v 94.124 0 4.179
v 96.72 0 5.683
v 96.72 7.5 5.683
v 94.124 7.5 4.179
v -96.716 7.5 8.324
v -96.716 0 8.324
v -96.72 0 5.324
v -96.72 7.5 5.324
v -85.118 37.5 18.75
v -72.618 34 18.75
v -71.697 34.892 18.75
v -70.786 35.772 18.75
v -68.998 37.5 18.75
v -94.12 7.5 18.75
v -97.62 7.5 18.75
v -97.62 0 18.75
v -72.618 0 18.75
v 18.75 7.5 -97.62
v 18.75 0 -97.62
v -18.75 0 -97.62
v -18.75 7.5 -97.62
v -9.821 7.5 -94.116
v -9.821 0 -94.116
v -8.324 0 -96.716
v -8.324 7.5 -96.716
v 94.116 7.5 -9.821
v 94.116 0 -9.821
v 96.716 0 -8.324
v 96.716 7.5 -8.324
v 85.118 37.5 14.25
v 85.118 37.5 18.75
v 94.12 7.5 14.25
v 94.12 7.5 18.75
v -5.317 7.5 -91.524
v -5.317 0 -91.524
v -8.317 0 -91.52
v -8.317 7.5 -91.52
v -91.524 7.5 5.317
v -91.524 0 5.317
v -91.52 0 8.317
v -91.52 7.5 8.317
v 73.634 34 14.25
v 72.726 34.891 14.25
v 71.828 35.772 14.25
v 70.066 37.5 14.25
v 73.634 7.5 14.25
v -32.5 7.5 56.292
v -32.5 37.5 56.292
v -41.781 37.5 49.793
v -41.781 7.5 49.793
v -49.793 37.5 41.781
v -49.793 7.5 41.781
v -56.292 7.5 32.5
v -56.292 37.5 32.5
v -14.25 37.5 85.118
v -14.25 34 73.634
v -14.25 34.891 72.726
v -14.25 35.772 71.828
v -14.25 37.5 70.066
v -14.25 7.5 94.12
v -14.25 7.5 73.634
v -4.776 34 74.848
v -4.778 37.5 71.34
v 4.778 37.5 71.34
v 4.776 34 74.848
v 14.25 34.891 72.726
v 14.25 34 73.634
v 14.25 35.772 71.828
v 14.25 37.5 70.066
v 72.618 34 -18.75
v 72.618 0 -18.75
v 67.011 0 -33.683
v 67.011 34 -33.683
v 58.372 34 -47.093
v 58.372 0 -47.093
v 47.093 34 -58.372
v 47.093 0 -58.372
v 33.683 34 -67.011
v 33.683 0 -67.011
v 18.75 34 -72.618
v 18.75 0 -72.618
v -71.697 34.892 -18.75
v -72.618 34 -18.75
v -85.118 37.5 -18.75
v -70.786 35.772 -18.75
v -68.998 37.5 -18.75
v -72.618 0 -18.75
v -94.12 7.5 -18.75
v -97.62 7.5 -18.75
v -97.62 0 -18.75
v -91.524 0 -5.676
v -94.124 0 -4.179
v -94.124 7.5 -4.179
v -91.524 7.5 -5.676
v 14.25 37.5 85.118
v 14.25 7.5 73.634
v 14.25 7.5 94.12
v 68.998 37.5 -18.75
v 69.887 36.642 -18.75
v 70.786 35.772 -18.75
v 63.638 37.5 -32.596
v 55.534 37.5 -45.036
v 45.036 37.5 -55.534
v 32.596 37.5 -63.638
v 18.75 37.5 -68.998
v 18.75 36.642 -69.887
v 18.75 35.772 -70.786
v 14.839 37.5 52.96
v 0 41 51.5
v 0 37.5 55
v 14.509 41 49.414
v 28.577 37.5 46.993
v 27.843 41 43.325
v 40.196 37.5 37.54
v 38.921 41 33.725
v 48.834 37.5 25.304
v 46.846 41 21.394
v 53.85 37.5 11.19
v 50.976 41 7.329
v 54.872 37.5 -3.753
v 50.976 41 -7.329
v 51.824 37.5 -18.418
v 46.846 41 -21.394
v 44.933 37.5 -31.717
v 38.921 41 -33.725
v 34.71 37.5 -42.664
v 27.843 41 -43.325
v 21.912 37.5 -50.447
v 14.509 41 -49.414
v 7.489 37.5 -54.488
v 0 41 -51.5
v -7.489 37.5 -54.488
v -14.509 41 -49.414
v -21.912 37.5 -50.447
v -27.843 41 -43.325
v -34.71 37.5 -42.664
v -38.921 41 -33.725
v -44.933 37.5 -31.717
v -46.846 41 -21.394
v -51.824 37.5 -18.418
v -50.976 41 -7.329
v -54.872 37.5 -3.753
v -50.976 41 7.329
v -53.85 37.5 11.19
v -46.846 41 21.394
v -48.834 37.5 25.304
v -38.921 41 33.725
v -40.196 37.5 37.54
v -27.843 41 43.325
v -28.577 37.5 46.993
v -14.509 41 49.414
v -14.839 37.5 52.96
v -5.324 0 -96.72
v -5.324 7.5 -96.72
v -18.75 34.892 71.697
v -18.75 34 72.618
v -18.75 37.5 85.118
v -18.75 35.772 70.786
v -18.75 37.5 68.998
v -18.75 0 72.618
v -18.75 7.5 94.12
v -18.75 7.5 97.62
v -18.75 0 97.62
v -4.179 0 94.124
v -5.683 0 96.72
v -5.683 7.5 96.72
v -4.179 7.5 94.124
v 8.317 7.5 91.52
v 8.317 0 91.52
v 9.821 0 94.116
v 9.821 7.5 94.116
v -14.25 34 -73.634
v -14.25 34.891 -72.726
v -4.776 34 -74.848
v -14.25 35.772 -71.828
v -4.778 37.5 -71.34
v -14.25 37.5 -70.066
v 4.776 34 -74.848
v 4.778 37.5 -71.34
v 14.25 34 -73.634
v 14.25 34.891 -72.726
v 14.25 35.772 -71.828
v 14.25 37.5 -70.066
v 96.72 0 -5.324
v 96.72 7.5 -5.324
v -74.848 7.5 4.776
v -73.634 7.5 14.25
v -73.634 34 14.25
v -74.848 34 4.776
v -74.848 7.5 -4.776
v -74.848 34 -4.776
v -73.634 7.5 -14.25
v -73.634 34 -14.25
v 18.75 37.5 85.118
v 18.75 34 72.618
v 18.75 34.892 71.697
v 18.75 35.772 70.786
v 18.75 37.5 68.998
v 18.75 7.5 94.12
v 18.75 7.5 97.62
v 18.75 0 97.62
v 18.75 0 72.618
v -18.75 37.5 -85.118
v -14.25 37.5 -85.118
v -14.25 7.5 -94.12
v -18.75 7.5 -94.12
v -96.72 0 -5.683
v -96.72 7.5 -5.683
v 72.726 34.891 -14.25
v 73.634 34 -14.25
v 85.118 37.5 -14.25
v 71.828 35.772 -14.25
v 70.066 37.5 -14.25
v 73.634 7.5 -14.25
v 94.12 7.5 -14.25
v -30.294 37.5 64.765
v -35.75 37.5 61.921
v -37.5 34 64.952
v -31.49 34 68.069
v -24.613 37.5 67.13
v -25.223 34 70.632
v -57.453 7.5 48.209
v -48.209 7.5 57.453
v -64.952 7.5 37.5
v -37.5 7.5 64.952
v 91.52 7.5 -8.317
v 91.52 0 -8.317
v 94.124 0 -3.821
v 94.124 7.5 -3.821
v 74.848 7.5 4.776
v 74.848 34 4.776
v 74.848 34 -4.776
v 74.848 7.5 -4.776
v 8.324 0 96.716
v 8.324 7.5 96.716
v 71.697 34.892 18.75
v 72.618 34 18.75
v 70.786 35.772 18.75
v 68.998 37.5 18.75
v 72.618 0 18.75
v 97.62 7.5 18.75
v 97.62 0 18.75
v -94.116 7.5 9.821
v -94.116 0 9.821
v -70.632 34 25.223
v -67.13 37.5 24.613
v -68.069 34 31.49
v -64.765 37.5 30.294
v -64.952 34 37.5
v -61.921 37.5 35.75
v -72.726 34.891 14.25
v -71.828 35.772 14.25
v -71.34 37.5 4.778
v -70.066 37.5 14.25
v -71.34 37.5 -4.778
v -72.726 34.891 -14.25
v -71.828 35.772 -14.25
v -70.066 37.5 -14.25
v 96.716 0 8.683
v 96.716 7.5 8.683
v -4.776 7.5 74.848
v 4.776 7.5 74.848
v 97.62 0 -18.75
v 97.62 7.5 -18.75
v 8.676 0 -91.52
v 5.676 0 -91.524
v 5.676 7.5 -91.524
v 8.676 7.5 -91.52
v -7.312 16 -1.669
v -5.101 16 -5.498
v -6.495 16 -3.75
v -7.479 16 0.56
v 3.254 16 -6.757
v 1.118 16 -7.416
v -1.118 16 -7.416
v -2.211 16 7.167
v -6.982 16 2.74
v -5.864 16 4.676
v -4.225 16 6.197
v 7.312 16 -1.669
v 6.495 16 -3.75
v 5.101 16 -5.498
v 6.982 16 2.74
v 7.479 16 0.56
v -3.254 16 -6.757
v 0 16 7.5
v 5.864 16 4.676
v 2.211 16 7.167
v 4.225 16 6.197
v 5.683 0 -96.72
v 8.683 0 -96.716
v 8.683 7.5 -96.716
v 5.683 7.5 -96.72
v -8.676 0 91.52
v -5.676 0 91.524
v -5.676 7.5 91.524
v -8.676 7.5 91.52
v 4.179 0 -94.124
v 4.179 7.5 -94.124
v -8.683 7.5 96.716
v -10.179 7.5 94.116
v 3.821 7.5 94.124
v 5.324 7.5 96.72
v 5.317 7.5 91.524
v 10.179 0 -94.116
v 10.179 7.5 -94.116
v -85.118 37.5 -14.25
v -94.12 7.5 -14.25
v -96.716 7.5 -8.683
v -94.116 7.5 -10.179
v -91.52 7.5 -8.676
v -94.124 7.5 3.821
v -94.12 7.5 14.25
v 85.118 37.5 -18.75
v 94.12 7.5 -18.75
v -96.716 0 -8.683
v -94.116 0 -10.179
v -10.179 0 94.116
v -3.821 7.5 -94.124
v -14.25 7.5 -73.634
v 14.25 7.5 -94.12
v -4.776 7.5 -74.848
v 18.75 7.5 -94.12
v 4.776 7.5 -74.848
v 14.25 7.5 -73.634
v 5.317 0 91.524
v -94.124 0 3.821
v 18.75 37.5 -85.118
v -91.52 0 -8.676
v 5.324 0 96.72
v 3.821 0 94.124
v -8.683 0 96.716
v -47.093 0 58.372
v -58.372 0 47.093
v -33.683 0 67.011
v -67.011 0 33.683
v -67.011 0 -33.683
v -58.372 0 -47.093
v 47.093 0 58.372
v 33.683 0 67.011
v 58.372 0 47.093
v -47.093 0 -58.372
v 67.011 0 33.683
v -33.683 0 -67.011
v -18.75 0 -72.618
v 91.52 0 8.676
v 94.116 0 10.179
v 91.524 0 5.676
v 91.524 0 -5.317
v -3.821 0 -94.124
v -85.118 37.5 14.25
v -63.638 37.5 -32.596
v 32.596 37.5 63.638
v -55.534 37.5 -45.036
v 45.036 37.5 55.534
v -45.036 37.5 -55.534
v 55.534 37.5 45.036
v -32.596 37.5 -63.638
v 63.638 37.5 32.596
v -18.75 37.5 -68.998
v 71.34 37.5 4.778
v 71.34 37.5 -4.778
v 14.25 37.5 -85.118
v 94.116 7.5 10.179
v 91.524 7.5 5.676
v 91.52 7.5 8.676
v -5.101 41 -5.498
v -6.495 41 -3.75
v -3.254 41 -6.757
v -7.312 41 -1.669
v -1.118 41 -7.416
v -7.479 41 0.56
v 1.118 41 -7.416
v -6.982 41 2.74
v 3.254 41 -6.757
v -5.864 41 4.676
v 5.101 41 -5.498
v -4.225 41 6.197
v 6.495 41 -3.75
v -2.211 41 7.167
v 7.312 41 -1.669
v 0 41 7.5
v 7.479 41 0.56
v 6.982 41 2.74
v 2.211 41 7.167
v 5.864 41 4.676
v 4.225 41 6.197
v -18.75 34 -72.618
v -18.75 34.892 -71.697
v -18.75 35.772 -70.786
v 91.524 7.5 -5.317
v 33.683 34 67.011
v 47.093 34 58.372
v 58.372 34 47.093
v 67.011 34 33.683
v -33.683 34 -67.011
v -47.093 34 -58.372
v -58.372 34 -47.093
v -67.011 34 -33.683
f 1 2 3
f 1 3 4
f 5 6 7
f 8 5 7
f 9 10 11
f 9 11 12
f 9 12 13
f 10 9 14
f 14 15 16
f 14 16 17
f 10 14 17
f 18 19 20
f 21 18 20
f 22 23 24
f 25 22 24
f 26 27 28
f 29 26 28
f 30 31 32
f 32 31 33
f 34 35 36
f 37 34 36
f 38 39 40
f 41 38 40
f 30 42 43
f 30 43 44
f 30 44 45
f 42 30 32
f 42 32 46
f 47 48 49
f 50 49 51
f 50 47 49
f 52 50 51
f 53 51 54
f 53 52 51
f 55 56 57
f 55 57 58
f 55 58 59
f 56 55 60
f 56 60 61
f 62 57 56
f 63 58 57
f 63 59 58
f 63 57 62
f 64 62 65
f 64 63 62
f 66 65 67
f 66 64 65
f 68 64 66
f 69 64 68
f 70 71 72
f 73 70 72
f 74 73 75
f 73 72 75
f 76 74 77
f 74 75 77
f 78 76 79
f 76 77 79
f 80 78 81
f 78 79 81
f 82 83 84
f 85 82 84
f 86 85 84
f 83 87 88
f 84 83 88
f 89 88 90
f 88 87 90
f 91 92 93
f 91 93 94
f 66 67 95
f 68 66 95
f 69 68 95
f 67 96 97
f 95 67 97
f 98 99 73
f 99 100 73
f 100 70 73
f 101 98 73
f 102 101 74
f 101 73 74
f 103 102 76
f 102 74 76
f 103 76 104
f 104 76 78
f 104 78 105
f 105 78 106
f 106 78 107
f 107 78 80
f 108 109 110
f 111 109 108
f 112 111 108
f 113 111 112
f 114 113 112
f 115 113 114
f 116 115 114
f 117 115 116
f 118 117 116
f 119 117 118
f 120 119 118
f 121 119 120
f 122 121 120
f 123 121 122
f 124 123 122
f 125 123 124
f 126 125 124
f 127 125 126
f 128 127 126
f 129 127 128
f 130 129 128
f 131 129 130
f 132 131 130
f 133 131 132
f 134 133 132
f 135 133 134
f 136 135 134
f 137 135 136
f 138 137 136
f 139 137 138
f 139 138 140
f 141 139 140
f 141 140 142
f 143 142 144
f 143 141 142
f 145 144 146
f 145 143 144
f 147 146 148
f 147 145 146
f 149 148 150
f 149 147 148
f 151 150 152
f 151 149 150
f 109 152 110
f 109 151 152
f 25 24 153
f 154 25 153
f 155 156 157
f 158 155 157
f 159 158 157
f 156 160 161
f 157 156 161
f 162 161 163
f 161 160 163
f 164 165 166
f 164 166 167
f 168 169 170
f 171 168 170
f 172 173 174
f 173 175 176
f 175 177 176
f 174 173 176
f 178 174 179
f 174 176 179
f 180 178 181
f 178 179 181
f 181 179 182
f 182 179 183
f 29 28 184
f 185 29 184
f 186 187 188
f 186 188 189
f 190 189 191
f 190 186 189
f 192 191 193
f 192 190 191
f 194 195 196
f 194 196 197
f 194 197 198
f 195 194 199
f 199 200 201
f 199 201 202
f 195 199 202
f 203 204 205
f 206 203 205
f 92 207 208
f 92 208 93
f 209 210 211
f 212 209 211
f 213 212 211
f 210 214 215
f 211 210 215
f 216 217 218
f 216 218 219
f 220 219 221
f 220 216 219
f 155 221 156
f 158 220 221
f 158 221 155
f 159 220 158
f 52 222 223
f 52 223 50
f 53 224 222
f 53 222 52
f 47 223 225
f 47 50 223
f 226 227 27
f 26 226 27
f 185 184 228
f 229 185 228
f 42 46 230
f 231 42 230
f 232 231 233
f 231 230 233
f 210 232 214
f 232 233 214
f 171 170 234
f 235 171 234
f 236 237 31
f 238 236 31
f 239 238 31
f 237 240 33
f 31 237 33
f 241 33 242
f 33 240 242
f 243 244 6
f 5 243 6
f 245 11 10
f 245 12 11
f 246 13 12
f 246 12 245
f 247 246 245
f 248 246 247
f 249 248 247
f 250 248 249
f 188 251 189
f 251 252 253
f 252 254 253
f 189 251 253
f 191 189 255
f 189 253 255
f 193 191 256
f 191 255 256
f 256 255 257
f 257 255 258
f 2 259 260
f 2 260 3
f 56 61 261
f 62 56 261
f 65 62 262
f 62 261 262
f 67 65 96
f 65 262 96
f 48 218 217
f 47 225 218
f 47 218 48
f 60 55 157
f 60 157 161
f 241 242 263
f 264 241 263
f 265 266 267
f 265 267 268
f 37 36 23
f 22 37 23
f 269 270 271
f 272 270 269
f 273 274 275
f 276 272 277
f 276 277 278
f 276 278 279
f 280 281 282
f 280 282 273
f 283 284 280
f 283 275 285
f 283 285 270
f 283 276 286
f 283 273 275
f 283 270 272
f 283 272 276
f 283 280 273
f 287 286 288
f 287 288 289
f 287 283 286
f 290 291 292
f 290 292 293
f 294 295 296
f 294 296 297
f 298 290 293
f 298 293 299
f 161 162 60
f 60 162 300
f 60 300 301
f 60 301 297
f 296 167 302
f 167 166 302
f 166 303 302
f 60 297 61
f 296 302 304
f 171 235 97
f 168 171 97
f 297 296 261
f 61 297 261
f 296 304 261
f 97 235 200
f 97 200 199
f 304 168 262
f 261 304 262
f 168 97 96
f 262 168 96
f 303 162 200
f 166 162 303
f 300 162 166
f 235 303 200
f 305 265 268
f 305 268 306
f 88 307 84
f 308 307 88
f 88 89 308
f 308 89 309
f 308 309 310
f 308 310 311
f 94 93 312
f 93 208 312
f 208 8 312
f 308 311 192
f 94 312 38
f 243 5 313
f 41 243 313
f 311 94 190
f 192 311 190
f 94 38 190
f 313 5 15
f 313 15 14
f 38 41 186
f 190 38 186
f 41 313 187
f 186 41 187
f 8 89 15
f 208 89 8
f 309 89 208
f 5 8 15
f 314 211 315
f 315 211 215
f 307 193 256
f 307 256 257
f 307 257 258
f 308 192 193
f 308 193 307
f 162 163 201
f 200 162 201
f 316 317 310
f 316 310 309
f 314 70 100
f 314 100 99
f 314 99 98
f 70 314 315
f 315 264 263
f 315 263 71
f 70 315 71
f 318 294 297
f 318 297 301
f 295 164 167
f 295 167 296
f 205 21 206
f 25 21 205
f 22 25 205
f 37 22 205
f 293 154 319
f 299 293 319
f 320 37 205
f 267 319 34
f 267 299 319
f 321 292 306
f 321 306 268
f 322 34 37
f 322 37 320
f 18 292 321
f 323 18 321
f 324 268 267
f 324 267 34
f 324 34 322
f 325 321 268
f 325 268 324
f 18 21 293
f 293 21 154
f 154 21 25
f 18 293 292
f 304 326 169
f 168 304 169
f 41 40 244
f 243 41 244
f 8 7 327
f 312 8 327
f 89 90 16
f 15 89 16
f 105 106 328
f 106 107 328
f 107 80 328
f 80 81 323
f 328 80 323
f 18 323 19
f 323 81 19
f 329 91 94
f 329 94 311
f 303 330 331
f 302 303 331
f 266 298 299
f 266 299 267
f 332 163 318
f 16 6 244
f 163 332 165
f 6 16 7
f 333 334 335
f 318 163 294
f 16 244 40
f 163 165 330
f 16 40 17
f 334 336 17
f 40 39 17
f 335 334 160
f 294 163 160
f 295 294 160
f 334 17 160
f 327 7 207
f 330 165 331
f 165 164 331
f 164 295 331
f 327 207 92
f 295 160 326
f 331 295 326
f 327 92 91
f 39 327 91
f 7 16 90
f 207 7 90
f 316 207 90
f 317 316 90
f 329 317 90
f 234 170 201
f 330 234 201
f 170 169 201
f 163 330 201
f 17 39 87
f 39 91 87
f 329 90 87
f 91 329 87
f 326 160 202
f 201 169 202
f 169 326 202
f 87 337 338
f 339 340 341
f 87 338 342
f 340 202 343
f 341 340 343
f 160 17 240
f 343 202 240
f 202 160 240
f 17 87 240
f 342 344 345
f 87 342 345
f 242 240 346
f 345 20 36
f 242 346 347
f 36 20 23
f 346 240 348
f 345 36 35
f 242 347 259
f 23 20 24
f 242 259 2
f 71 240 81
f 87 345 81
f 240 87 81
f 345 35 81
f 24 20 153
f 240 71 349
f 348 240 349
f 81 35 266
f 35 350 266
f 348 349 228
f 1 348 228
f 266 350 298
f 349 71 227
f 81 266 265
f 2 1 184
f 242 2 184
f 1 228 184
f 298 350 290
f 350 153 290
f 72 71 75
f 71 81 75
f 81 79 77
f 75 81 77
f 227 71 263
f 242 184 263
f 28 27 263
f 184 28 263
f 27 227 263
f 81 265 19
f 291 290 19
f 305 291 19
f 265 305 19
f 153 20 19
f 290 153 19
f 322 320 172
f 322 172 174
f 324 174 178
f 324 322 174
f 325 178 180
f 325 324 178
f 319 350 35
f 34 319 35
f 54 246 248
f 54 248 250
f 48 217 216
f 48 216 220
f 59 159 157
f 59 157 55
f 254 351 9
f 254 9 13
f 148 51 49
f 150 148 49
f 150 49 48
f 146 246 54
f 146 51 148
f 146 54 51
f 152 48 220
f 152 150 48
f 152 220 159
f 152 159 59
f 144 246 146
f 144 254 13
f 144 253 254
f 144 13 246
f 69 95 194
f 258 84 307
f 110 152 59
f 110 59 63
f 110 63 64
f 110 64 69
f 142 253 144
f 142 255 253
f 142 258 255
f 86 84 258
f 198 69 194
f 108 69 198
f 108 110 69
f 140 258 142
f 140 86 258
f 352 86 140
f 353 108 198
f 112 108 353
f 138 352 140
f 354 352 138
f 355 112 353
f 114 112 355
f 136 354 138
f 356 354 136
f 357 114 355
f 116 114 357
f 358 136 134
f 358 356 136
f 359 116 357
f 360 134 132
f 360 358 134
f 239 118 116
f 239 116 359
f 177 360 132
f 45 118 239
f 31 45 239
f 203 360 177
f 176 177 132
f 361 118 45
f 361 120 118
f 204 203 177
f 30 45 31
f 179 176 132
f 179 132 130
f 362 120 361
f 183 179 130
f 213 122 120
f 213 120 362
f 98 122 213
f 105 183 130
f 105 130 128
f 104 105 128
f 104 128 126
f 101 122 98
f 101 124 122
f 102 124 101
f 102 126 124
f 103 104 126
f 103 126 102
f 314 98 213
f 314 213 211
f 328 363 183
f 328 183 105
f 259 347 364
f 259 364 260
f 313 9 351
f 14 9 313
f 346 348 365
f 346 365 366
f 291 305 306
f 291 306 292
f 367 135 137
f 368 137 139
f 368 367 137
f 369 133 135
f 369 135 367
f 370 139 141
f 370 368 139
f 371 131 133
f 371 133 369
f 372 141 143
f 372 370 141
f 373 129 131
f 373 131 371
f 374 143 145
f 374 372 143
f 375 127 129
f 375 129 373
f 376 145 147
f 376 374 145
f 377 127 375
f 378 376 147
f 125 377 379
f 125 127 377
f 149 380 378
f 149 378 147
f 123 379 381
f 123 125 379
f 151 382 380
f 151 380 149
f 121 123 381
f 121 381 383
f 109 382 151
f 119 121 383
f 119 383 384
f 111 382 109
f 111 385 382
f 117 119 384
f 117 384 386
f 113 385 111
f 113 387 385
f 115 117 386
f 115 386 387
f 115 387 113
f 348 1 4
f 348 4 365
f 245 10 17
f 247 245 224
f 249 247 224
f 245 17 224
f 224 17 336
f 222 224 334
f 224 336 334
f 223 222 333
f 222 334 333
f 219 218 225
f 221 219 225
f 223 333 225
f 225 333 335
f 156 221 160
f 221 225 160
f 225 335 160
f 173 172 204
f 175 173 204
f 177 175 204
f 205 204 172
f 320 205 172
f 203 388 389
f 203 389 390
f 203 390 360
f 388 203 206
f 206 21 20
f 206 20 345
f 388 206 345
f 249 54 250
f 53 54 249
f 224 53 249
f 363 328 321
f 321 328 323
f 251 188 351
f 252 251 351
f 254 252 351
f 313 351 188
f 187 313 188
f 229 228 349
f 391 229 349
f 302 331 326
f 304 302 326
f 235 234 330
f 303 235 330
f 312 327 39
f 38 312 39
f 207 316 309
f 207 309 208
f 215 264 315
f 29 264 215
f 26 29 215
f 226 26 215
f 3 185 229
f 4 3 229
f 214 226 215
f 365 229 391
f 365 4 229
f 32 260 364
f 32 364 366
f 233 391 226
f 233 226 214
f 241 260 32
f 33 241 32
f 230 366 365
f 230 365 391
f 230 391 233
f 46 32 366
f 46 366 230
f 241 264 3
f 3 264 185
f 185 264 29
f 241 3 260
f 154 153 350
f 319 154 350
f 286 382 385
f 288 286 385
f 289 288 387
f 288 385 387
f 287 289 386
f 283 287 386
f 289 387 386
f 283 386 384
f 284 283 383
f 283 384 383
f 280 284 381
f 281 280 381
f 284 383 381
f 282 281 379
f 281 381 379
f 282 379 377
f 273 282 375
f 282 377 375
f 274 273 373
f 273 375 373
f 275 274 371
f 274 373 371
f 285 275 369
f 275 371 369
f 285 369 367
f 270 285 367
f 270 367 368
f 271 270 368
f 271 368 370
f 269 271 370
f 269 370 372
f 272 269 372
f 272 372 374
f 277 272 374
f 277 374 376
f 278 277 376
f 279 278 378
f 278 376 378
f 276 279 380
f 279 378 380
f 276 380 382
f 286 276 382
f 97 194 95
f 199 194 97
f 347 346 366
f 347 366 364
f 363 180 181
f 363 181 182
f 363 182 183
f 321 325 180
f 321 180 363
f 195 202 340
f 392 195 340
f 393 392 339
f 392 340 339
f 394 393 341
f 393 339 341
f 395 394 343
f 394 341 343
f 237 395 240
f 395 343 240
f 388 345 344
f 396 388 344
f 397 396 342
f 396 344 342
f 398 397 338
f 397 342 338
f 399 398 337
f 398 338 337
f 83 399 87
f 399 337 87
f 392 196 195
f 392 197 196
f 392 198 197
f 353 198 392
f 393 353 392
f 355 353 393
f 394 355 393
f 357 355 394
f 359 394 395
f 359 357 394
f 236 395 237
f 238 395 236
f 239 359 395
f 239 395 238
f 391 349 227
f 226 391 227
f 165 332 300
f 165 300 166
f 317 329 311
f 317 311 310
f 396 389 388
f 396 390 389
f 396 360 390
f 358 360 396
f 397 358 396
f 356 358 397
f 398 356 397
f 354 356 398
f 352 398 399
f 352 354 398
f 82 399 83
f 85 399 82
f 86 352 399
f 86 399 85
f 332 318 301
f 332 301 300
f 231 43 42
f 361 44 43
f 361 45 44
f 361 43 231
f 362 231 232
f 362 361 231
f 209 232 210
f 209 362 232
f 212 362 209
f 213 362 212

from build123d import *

# Parameters (mm, degrees)
BOSS_EXTRUDE1_DEPTH                      = 37.5
SKETCH4_W                                = 3.5
SKETCH4_H                                = 30
CUT_EXTRUDE1_DEPTH                       = 37.5
SKETCH7_W                                = 3.5
SKETCH7_H                                = 30
CUT_EXTRUDE3_DEPTH                       = 157.454118834
CUT_EXTRUDE4_START                       = -30
CUT_EXTRUDE4_DEPTH                       = 30
CHAMFER1_SIZE                            = 3.5
CUT_EXTRUDE5_DEPTH                       = 157.454118834
MIRROR4_AT_THE_SECOND_PLANE_COPY_1_DEPTH = 157.454118834
CUT_EXTRUDE6_DEPTH                       = 157.454118834
CUT_EXTRUDE7_DEPTH                       = 144.057956088
CUT_EXTRUDE7_DEPTH_BACK                  = 30
SKETCH14_R                               = 55
BOSS_EXTRUDE3_DEPTH                      = 3.5
CHAMFER2_SIZE                            = 3.5
SKETCH15_R                               = 7.5
CUT_EXTRUDE8_DEPTH                       = 25


with BuildPart() as part:
    # Sketch2 → Boss-Extrude1 (new body)
    with BuildSketch(Plane(origin=(0, 0, 0), x_dir=(1, 0, 0), z_dir=(0, 1, 0))):
        with BuildLine():
            Line((97.62, 0), (97.62, 18.75))
            Line((97.62, 18.75), (72.618437741, 18.75))
            ThreePointArc((72.618437741, 18.75), (53.033008589, 53.033008589), (18.75, 72.618437741))
            Line((18.75, 72.618437741), (18.75, 97.62))
            Line((18.75, 97.62), (0, 97.62))
            Line((0, 97.62), (-18.75, 97.62))
            Line((-18.75, 97.62), (-18.75, 72.618437741))
            ThreePointArc((-18.75, 72.618437741), (-53.033008589, 53.033008589), (-72.618437741, 18.75))
            Line((-72.618437741, 18.75), (-97.62, 18.75))
            Line((-97.62, 18.75), (-97.62, 0))
            Line((-97.62, 0), (-97.62, -18.75))
            Line((-97.62, -18.75), (-72.618437741, -18.75))
            ThreePointArc((-72.618437741, -18.75), (-53.033008589, -53.033008589), (-18.75, -72.618437741))
            Line((-18.75, -72.618437741), (-18.75, -97.62))
            Line((-18.75, -97.62), (0, -97.62))
            Line((0, -97.62), (18.75, -97.62))
            Line((18.75, -97.62), (18.75, -72.618437741))
            ThreePointArc((18.75, -72.618437741), (53.033008589, -53.033008589), (72.618437741, -18.75))
            Line((72.618437741, -18.75), (97.62, -18.75))
            Line((97.62, -18.75), (97.62, 0))
        make_face()
        Polygon((8.323894459, -96.71614814), (5.323896931, -96.72), (3.820562359, -94.12385186), (5.317225314, -91.52385186), (8.317222841, -91.52), (9.820557413, -94.11614814), align=None, mode=Mode.SUBTRACT)
        Polygon((-5.682777159, -96.72), (-4.179442587, -94.12385186), (-5.676105541, -91.52385186), (-8.676103069, -91.52), (-10.179437641, -94.11614814), (-8.682774686, -96.71614814), align=None, mode=Mode.SUBTRACT)
        Polygon((-96.71614814, -8.323894459), (-96.72, -5.323896931), (-94.12385186, -3.820562359), (-91.52385186, -5.317225314), (-91.52, -8.317222841), (-94.11614814, -9.820557413), align=None, mode=Mode.SUBTRACT)
        Polygon((96.72, -5.682777159), (94.12385186, -4.179442587), (91.52385186, -5.676105541), (91.52, -8.676103069), (94.11614814, -10.179437641), (96.71614814, -8.682774686), align=None, mode=Mode.SUBTRACT)
        Polygon((96.71614814, 8.323894459), (96.72, 5.323896931), (94.12385186, 3.820562359), (91.52385186, 5.317225314), (91.52, 8.317222841), (94.11614814, 9.820557413), align=None, mode=Mode.SUBTRACT)
        Polygon((-96.72, 5.682777159), (-94.12385186, 4.179442587), (-91.52385186, 5.676105541), (-91.52, 8.676103069), (-94.11614814, 10.179437641), (-96.71614814, 8.682774686), align=None, mode=Mode.SUBTRACT)
        Polygon((-8.323894459, 96.71614814), (-5.323896931, 96.72), (-3.820562359, 94.12385186), (-5.317225314, 91.52385186), (-8.317222841, 91.52), (-9.820557413, 94.11614814), align=None, mode=Mode.SUBTRACT)
        Polygon((5.682777159, 96.72), (4.179442587, 94.12385186), (5.676105541, 91.52385186), (8.676103069, 91.52), (10.179437641, 94.11614814), (8.682774686, 96.71614814), align=None, mode=Mode.SUBTRACT)
    extrude(amount=BOSS_EXTRUDE1_DEPTH)

    # Sketch4 → Cut-Extrude1 (cut)
    with BuildSketch(Plane.XY.offset(18.75)):
        with Locations((-95.87, 22.5)):
            Rectangle(SKETCH4_W, SKETCH4_H)
    cut_extrude1 = extrude(amount=-CUT_EXTRUDE1_DEPTH, mode=Mode.SUBTRACT)

    # Sketch7 → Cut-Extrude3 (cut, through all)
    with BuildSketch(Plane(origin=(18.75, 0, 0), x_dir=(0, 0, -1), z_dir=(1, 0, 0))):
        with Locations((-95.87, 22.5)):
            Rectangle(SKETCH7_W, SKETCH7_H)
    cut_extrude3 = extrude(amount=-CUT_EXTRUDE3_DEPTH, mode=Mode.SUBTRACT)

    # Mirror1: Cut-Extrude3 across plane
    add(cut_extrude3.mirror(Plane.XY), mode=Mode.SUBTRACT)

    # Mirror2: Cut-Extrude1 across plane
    add(cut_extrude1.mirror(Plane.ZY), mode=Mode.SUBTRACT)

    # Sketch8 → Cut-Extrude4 (cut)
    with BuildSketch(Plane(origin=(0, 37.5, 0), x_dir=(1, 0, 0), z_dir=(0, 1, 0)).offset(CUT_EXTRUDE4_START)):
        with BuildLine():
            Line((-14.25, 94.12), (-14.25, 73.633806774))
            ThreePointArc((-14.25, 73.633806774), (0, 75), (14.25, 73.633806774))
            Line((14.25, 73.633806774), (14.25, 94.12))
            Line((14.25, 94.12), (-14.25, 94.12))
        make_face()
        with BuildLine():
            Line((-94.12, 14.25), (-94.12, -14.25))
            Line((-94.12, -14.25), (-73.633806774, -14.25))
            ThreePointArc((-73.633806774, -14.25), (-75, 0), (-73.633806774, 14.25))
            Line((-73.633806774, 14.25), (-94.12, 14.25))
        make_face()
    cut_extrude4 = extrude(amount=CUT_EXTRUDE4_DEPTH, mode=Mode.SUBTRACT)

    # Mirror3: Cut-Extrude4 across plane
    add(cut_extrude4.mirror(Plane.ZY), mode=Mode.SUBTRACT)

    # Mirror3 at the second plane: Cut-Extrude4 across plane
    add(cut_extrude4.mirror(Plane.XY), mode=Mode.SUBTRACT)

    # Chamfer1
    chamfer1_edges = [part.edges().sort_by_distance(p)[0] for p in [
        (53.033008589, 37.5, -53.033008589),
        (0, 37.5, -75),
        (-75, 37.5, 0),
        (0, 37.5, 75),
        (-53.033008589, 37.5, -53.033008589),
        (75, 37.5, 0),
        (-53.033008589, 37.5, 53.033008589),
        (53.033008589, 37.5, 53.033008589),
    ]]
    chamfer(chamfer1_edges, length=CHAMFER1_SIZE)

    # Sketch9 → Cut-Extrude5 (cut, symmetric)
    with BuildSketch(Plane(origin=(18.75, 0, 0), x_dir=(0, 0, -1), z_dir=(1, 0, 0))):
        Polygon((-85.118437741, 37.5), (-94.12, 7.5), (-94.12, 37.5), align=None)
    cut_extrude5 = extrude(amount=CUT_EXTRUDE5_DEPTH, both=True, mode=Mode.SUBTRACT)

    # Mirror4: Cut-Extrude5 across plane
    add(cut_extrude5.mirror(Plane.ZY), mode=Mode.SUBTRACT)

    # Mirror4 at the second plane: Cut-Extrude5 across plane
    add(cut_extrude5.mirror(Plane.XY), mode=Mode.SUBTRACT)

    # Mirror4 at the second plane copy 1 sketc → Mirror4 at the second plane copy 1 (cut, symmetric)
    with BuildSketch(Plane.ZY.offset(18.75)):
        Polygon((-85.118437741, 37.5), (-94.12, 7.5), (-94.12, 37.5), align=None)
    extrude(amount=MIRROR4_AT_THE_SECOND_PLANE_COPY_1_DEPTH, both=True, mode=Mode.SUBTRACT)

    # Sketch10 → Cut-Extrude6 (cut, symmetric)
    with BuildSketch(Plane.XY.offset(18.75)):
        Polygon((-85.118437741, 37.5), (-94.12, 7.5), (-94.12, 37.5), align=None)
    cut_extrude6 = extrude(amount=CUT_EXTRUDE6_DEPTH, both=True, mode=Mode.SUBTRACT)

    # Mirror5: Cut-Extrude6 across plane
    add(cut_extrude6.mirror(Plane.ZY), mode=Mode.SUBTRACT)

    # Sketch11 → Cut-Extrude7 (cut, two sides: drawn at the far end of the back side and taken through both)
    with BuildSketch(Plane(origin=(0, 37.5, 0), x_dir=(1, 0, 0), z_dir=(0, 1, 0)).offset(-CUT_EXTRUDE7_DEPTH_BACK)):
        with BuildLine():
            Line((-56.291651246, -32.5), (-64.951905284, -37.5))
            ThreePointArc((-64.951905284, -37.5), (-53.033008589, -53.033008589), (-37.5, -64.951905284))
            Line((-37.5, -64.951905284), (-32.5, -56.291651246))
            ThreePointArc((-32.5, -56.291651246), (-45.961940777, -45.961940777), (-56.291651246, -32.5))
        make_face()
    extrude(amount=CUT_EXTRUDE7_DEPTH + CUT_EXTRUDE7_DEPTH_BACK, mode=Mode.SUBTRACT)

    # Sketch14 → Boss-Extrude3 (add)
    with BuildSketch(Plane(origin=(0, 37.5, 0), x_dir=(1, 0, 0), z_dir=(0, 1, 0))):
        with Locations(Location((0, 0, 0), (0, 0, 270))):
            Circle(SKETCH14_R)
    extrude(amount=BOSS_EXTRUDE3_DEPTH)

    # Chamfer2
    chamfer2_edges = [part.edges().sort_by_distance(p)[0] for p in [
        (0, 41, -55),
    ]]
    chamfer(chamfer2_edges, length=CHAMFER2_SIZE - 0.0001)  # a hair under: the kernel refuses the full size

    # Sketch15 → Cut-Extrude8 (cut)
    with BuildSketch(Plane(origin=(0, 41, 0), x_dir=(1, 0, 0), z_dir=(0, 1, 0))):
        with Locations(Location((0, 0, 0), (0, 0, 270))):
            Circle(SKETCH15_R)
    extrude(amount=-CUT_EXTRUDE8_DEPTH, mode=Mode.SUBTRACT)


solid = part.part
